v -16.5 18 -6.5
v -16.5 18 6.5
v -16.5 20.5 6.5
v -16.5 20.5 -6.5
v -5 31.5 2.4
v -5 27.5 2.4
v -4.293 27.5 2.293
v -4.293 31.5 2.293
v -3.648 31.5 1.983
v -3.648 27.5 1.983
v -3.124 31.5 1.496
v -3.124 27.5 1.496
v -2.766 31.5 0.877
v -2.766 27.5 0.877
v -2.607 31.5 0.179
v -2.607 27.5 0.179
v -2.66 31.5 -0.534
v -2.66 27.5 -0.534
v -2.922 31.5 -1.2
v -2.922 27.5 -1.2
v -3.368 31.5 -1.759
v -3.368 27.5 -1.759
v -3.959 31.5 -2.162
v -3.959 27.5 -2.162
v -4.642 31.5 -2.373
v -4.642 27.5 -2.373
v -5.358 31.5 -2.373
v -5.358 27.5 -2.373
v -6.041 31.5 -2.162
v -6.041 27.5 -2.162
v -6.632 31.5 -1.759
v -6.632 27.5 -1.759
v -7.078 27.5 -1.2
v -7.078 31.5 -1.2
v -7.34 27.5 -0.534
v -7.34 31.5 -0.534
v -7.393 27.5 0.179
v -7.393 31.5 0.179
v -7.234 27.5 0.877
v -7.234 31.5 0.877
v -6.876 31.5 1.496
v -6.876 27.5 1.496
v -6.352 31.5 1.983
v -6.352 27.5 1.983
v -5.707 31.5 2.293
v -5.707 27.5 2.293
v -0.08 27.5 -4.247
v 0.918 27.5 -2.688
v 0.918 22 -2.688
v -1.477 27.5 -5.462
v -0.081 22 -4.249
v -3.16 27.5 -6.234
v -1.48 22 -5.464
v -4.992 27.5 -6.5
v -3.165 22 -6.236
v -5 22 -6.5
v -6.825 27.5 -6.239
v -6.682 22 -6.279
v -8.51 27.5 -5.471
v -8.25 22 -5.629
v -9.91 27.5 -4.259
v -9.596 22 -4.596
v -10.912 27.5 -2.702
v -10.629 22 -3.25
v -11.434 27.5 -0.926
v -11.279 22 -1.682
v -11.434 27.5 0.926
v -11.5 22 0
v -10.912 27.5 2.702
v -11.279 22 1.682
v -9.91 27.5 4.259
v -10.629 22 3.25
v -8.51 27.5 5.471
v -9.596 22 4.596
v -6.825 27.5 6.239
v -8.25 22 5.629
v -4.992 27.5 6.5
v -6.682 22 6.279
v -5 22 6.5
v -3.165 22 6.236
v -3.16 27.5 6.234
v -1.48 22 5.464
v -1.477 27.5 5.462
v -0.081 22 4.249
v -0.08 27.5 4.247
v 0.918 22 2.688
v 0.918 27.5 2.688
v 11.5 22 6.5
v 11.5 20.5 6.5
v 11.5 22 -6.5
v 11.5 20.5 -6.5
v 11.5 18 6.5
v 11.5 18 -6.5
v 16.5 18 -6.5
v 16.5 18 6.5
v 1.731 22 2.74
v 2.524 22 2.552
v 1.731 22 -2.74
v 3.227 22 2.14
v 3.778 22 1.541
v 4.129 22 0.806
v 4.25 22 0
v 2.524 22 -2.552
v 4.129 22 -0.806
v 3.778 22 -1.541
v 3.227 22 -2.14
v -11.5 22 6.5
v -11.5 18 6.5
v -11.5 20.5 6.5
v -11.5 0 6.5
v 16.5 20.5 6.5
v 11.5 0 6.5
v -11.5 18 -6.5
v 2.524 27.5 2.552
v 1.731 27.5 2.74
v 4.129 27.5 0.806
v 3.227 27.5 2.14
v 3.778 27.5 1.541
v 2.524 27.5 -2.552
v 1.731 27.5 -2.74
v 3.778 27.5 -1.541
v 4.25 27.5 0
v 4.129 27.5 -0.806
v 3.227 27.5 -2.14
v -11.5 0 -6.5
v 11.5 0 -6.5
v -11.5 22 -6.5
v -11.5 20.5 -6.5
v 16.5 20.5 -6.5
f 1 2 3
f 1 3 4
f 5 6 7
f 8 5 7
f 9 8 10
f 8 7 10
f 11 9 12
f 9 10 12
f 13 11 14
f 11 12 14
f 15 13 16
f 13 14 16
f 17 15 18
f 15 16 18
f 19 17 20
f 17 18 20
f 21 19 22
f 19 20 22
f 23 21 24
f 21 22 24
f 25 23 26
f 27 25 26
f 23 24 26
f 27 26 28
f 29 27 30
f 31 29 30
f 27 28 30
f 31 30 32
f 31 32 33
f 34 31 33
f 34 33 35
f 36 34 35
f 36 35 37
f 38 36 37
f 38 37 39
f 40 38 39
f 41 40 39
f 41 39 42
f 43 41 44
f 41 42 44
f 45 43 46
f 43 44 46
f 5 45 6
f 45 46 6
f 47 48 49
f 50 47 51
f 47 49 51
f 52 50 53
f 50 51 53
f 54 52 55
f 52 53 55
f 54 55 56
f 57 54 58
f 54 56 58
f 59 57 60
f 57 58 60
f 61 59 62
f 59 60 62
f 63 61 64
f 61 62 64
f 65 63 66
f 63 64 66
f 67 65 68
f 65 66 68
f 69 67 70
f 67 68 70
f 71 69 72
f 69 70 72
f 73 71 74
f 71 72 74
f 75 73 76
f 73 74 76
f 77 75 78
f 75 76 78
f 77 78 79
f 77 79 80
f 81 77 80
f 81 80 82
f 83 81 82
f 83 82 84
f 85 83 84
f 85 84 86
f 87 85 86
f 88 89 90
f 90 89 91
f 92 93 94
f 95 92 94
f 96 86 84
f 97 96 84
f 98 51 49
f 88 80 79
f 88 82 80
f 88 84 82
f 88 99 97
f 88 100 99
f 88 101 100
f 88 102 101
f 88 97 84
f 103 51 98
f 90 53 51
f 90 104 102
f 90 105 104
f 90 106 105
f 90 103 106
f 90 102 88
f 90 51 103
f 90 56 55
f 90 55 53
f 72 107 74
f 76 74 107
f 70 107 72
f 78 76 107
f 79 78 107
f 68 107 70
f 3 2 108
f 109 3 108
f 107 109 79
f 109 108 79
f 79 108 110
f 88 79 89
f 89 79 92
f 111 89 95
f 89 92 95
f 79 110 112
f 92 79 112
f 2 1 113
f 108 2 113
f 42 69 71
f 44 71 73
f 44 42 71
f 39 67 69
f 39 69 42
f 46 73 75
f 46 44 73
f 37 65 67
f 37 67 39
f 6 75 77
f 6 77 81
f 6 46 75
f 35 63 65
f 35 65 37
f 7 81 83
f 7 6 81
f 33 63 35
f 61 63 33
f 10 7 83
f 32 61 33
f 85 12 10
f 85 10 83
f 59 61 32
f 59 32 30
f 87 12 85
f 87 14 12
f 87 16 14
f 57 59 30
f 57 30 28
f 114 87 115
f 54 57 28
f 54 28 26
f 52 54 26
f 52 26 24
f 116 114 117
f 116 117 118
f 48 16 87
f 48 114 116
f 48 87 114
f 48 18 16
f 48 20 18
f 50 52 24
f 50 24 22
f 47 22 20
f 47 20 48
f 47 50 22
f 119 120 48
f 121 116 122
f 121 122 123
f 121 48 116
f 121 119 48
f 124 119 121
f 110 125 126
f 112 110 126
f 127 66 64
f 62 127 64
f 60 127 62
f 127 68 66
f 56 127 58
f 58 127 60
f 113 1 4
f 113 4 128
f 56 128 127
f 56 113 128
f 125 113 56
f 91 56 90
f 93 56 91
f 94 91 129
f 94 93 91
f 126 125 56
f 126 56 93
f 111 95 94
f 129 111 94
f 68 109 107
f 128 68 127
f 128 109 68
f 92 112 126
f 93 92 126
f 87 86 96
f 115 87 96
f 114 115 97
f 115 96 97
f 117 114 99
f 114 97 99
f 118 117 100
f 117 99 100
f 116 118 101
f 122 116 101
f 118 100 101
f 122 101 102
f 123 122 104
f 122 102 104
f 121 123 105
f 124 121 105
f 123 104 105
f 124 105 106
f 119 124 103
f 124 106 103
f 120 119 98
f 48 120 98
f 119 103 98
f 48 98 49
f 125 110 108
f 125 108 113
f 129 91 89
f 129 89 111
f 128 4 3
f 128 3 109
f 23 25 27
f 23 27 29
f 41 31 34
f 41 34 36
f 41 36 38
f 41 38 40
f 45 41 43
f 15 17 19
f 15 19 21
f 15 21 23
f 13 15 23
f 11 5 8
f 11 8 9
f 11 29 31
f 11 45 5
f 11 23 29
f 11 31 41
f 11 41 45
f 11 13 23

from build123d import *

# Parameters (mm, degrees)
SKETCH1_W           = 23
SKETCH1_H           = 13
BOSS_EXTRUDE1_DEPTH = 18
SKETCH2_W           = 33
SKETCH2_H           = 13
BOSS_EXTRUDE2_DEPTH = 2.5
SKETCH3_W           = 23
SKETCH3_H           = 13
BOSS_EXTRUDE3_DEPTH = 1.5
BOSS_EXTRUDE4_DEPTH = 5.5
SKETCH5_R           = 2.4
BOSS_EXTRUDE5_DEPTH = 4


with BuildPart() as part:
    # Sketch1 → Boss-Extrude1 (new body)
    with BuildSketch(Plane(origin=(0, 0, 0), x_dir=(1, 0, 0), z_dir=(0, 1, 0))):
        Rectangle(SKETCH1_W, SKETCH1_H)
    extrude(amount=BOSS_EXTRUDE1_DEPTH)

    # Sketch2 → Boss-Extrude2 (add)
    with BuildSketch(Plane(origin=(0, 18, 0), x_dir=(1, 0, 0), z_dir=(0, 1, 0))):
        Rectangle(SKETCH2_W, SKETCH2_H)
    extrude(amount=BOSS_EXTRUDE2_DEPTH)

    # Sketch3 → Boss-Extrude3 (add)
    with BuildSketch(Plane(origin=(0, 20.5, 0), x_dir=(1, 0, 0), z_dir=(0, 1, 0))):
        Rectangle(SKETCH3_W, SKETCH3_H)
    extrude(amount=BOSS_EXTRUDE3_DEPTH)

    # Sketch4 → Boss-Extrude4 (add)
    with BuildSketch(Plane(origin=(0, 22, 0), x_dir=(1, 0, 0), z_dir=(0, 1, 0))):
        with BuildLine():
            ThreePointArc((0.918269231, 2.687766603), (-11.5, 0), (0.918269231, -2.687766603))
            ThreePointArc((0.918269231, -2.687766603), (4.25, 0), (0.918269231, 2.687766603))
        make_face()
    extrude(amount=BOSS_EXTRUDE4_DEPTH)

    # Sketch5 → Boss-Extrude5 (add)
    with BuildSketch(Plane(origin=(0, 27.5, 0), x_dir=(1, 0, 0), z_dir=(0, 1, 0))):
        with Locations(Location((-5, 0, 0), (0, 0, 270))):
            Circle(SKETCH5_R)
    extrude(amount=BOSS_EXTRUDE5_DEPTH)


solid = part.part
